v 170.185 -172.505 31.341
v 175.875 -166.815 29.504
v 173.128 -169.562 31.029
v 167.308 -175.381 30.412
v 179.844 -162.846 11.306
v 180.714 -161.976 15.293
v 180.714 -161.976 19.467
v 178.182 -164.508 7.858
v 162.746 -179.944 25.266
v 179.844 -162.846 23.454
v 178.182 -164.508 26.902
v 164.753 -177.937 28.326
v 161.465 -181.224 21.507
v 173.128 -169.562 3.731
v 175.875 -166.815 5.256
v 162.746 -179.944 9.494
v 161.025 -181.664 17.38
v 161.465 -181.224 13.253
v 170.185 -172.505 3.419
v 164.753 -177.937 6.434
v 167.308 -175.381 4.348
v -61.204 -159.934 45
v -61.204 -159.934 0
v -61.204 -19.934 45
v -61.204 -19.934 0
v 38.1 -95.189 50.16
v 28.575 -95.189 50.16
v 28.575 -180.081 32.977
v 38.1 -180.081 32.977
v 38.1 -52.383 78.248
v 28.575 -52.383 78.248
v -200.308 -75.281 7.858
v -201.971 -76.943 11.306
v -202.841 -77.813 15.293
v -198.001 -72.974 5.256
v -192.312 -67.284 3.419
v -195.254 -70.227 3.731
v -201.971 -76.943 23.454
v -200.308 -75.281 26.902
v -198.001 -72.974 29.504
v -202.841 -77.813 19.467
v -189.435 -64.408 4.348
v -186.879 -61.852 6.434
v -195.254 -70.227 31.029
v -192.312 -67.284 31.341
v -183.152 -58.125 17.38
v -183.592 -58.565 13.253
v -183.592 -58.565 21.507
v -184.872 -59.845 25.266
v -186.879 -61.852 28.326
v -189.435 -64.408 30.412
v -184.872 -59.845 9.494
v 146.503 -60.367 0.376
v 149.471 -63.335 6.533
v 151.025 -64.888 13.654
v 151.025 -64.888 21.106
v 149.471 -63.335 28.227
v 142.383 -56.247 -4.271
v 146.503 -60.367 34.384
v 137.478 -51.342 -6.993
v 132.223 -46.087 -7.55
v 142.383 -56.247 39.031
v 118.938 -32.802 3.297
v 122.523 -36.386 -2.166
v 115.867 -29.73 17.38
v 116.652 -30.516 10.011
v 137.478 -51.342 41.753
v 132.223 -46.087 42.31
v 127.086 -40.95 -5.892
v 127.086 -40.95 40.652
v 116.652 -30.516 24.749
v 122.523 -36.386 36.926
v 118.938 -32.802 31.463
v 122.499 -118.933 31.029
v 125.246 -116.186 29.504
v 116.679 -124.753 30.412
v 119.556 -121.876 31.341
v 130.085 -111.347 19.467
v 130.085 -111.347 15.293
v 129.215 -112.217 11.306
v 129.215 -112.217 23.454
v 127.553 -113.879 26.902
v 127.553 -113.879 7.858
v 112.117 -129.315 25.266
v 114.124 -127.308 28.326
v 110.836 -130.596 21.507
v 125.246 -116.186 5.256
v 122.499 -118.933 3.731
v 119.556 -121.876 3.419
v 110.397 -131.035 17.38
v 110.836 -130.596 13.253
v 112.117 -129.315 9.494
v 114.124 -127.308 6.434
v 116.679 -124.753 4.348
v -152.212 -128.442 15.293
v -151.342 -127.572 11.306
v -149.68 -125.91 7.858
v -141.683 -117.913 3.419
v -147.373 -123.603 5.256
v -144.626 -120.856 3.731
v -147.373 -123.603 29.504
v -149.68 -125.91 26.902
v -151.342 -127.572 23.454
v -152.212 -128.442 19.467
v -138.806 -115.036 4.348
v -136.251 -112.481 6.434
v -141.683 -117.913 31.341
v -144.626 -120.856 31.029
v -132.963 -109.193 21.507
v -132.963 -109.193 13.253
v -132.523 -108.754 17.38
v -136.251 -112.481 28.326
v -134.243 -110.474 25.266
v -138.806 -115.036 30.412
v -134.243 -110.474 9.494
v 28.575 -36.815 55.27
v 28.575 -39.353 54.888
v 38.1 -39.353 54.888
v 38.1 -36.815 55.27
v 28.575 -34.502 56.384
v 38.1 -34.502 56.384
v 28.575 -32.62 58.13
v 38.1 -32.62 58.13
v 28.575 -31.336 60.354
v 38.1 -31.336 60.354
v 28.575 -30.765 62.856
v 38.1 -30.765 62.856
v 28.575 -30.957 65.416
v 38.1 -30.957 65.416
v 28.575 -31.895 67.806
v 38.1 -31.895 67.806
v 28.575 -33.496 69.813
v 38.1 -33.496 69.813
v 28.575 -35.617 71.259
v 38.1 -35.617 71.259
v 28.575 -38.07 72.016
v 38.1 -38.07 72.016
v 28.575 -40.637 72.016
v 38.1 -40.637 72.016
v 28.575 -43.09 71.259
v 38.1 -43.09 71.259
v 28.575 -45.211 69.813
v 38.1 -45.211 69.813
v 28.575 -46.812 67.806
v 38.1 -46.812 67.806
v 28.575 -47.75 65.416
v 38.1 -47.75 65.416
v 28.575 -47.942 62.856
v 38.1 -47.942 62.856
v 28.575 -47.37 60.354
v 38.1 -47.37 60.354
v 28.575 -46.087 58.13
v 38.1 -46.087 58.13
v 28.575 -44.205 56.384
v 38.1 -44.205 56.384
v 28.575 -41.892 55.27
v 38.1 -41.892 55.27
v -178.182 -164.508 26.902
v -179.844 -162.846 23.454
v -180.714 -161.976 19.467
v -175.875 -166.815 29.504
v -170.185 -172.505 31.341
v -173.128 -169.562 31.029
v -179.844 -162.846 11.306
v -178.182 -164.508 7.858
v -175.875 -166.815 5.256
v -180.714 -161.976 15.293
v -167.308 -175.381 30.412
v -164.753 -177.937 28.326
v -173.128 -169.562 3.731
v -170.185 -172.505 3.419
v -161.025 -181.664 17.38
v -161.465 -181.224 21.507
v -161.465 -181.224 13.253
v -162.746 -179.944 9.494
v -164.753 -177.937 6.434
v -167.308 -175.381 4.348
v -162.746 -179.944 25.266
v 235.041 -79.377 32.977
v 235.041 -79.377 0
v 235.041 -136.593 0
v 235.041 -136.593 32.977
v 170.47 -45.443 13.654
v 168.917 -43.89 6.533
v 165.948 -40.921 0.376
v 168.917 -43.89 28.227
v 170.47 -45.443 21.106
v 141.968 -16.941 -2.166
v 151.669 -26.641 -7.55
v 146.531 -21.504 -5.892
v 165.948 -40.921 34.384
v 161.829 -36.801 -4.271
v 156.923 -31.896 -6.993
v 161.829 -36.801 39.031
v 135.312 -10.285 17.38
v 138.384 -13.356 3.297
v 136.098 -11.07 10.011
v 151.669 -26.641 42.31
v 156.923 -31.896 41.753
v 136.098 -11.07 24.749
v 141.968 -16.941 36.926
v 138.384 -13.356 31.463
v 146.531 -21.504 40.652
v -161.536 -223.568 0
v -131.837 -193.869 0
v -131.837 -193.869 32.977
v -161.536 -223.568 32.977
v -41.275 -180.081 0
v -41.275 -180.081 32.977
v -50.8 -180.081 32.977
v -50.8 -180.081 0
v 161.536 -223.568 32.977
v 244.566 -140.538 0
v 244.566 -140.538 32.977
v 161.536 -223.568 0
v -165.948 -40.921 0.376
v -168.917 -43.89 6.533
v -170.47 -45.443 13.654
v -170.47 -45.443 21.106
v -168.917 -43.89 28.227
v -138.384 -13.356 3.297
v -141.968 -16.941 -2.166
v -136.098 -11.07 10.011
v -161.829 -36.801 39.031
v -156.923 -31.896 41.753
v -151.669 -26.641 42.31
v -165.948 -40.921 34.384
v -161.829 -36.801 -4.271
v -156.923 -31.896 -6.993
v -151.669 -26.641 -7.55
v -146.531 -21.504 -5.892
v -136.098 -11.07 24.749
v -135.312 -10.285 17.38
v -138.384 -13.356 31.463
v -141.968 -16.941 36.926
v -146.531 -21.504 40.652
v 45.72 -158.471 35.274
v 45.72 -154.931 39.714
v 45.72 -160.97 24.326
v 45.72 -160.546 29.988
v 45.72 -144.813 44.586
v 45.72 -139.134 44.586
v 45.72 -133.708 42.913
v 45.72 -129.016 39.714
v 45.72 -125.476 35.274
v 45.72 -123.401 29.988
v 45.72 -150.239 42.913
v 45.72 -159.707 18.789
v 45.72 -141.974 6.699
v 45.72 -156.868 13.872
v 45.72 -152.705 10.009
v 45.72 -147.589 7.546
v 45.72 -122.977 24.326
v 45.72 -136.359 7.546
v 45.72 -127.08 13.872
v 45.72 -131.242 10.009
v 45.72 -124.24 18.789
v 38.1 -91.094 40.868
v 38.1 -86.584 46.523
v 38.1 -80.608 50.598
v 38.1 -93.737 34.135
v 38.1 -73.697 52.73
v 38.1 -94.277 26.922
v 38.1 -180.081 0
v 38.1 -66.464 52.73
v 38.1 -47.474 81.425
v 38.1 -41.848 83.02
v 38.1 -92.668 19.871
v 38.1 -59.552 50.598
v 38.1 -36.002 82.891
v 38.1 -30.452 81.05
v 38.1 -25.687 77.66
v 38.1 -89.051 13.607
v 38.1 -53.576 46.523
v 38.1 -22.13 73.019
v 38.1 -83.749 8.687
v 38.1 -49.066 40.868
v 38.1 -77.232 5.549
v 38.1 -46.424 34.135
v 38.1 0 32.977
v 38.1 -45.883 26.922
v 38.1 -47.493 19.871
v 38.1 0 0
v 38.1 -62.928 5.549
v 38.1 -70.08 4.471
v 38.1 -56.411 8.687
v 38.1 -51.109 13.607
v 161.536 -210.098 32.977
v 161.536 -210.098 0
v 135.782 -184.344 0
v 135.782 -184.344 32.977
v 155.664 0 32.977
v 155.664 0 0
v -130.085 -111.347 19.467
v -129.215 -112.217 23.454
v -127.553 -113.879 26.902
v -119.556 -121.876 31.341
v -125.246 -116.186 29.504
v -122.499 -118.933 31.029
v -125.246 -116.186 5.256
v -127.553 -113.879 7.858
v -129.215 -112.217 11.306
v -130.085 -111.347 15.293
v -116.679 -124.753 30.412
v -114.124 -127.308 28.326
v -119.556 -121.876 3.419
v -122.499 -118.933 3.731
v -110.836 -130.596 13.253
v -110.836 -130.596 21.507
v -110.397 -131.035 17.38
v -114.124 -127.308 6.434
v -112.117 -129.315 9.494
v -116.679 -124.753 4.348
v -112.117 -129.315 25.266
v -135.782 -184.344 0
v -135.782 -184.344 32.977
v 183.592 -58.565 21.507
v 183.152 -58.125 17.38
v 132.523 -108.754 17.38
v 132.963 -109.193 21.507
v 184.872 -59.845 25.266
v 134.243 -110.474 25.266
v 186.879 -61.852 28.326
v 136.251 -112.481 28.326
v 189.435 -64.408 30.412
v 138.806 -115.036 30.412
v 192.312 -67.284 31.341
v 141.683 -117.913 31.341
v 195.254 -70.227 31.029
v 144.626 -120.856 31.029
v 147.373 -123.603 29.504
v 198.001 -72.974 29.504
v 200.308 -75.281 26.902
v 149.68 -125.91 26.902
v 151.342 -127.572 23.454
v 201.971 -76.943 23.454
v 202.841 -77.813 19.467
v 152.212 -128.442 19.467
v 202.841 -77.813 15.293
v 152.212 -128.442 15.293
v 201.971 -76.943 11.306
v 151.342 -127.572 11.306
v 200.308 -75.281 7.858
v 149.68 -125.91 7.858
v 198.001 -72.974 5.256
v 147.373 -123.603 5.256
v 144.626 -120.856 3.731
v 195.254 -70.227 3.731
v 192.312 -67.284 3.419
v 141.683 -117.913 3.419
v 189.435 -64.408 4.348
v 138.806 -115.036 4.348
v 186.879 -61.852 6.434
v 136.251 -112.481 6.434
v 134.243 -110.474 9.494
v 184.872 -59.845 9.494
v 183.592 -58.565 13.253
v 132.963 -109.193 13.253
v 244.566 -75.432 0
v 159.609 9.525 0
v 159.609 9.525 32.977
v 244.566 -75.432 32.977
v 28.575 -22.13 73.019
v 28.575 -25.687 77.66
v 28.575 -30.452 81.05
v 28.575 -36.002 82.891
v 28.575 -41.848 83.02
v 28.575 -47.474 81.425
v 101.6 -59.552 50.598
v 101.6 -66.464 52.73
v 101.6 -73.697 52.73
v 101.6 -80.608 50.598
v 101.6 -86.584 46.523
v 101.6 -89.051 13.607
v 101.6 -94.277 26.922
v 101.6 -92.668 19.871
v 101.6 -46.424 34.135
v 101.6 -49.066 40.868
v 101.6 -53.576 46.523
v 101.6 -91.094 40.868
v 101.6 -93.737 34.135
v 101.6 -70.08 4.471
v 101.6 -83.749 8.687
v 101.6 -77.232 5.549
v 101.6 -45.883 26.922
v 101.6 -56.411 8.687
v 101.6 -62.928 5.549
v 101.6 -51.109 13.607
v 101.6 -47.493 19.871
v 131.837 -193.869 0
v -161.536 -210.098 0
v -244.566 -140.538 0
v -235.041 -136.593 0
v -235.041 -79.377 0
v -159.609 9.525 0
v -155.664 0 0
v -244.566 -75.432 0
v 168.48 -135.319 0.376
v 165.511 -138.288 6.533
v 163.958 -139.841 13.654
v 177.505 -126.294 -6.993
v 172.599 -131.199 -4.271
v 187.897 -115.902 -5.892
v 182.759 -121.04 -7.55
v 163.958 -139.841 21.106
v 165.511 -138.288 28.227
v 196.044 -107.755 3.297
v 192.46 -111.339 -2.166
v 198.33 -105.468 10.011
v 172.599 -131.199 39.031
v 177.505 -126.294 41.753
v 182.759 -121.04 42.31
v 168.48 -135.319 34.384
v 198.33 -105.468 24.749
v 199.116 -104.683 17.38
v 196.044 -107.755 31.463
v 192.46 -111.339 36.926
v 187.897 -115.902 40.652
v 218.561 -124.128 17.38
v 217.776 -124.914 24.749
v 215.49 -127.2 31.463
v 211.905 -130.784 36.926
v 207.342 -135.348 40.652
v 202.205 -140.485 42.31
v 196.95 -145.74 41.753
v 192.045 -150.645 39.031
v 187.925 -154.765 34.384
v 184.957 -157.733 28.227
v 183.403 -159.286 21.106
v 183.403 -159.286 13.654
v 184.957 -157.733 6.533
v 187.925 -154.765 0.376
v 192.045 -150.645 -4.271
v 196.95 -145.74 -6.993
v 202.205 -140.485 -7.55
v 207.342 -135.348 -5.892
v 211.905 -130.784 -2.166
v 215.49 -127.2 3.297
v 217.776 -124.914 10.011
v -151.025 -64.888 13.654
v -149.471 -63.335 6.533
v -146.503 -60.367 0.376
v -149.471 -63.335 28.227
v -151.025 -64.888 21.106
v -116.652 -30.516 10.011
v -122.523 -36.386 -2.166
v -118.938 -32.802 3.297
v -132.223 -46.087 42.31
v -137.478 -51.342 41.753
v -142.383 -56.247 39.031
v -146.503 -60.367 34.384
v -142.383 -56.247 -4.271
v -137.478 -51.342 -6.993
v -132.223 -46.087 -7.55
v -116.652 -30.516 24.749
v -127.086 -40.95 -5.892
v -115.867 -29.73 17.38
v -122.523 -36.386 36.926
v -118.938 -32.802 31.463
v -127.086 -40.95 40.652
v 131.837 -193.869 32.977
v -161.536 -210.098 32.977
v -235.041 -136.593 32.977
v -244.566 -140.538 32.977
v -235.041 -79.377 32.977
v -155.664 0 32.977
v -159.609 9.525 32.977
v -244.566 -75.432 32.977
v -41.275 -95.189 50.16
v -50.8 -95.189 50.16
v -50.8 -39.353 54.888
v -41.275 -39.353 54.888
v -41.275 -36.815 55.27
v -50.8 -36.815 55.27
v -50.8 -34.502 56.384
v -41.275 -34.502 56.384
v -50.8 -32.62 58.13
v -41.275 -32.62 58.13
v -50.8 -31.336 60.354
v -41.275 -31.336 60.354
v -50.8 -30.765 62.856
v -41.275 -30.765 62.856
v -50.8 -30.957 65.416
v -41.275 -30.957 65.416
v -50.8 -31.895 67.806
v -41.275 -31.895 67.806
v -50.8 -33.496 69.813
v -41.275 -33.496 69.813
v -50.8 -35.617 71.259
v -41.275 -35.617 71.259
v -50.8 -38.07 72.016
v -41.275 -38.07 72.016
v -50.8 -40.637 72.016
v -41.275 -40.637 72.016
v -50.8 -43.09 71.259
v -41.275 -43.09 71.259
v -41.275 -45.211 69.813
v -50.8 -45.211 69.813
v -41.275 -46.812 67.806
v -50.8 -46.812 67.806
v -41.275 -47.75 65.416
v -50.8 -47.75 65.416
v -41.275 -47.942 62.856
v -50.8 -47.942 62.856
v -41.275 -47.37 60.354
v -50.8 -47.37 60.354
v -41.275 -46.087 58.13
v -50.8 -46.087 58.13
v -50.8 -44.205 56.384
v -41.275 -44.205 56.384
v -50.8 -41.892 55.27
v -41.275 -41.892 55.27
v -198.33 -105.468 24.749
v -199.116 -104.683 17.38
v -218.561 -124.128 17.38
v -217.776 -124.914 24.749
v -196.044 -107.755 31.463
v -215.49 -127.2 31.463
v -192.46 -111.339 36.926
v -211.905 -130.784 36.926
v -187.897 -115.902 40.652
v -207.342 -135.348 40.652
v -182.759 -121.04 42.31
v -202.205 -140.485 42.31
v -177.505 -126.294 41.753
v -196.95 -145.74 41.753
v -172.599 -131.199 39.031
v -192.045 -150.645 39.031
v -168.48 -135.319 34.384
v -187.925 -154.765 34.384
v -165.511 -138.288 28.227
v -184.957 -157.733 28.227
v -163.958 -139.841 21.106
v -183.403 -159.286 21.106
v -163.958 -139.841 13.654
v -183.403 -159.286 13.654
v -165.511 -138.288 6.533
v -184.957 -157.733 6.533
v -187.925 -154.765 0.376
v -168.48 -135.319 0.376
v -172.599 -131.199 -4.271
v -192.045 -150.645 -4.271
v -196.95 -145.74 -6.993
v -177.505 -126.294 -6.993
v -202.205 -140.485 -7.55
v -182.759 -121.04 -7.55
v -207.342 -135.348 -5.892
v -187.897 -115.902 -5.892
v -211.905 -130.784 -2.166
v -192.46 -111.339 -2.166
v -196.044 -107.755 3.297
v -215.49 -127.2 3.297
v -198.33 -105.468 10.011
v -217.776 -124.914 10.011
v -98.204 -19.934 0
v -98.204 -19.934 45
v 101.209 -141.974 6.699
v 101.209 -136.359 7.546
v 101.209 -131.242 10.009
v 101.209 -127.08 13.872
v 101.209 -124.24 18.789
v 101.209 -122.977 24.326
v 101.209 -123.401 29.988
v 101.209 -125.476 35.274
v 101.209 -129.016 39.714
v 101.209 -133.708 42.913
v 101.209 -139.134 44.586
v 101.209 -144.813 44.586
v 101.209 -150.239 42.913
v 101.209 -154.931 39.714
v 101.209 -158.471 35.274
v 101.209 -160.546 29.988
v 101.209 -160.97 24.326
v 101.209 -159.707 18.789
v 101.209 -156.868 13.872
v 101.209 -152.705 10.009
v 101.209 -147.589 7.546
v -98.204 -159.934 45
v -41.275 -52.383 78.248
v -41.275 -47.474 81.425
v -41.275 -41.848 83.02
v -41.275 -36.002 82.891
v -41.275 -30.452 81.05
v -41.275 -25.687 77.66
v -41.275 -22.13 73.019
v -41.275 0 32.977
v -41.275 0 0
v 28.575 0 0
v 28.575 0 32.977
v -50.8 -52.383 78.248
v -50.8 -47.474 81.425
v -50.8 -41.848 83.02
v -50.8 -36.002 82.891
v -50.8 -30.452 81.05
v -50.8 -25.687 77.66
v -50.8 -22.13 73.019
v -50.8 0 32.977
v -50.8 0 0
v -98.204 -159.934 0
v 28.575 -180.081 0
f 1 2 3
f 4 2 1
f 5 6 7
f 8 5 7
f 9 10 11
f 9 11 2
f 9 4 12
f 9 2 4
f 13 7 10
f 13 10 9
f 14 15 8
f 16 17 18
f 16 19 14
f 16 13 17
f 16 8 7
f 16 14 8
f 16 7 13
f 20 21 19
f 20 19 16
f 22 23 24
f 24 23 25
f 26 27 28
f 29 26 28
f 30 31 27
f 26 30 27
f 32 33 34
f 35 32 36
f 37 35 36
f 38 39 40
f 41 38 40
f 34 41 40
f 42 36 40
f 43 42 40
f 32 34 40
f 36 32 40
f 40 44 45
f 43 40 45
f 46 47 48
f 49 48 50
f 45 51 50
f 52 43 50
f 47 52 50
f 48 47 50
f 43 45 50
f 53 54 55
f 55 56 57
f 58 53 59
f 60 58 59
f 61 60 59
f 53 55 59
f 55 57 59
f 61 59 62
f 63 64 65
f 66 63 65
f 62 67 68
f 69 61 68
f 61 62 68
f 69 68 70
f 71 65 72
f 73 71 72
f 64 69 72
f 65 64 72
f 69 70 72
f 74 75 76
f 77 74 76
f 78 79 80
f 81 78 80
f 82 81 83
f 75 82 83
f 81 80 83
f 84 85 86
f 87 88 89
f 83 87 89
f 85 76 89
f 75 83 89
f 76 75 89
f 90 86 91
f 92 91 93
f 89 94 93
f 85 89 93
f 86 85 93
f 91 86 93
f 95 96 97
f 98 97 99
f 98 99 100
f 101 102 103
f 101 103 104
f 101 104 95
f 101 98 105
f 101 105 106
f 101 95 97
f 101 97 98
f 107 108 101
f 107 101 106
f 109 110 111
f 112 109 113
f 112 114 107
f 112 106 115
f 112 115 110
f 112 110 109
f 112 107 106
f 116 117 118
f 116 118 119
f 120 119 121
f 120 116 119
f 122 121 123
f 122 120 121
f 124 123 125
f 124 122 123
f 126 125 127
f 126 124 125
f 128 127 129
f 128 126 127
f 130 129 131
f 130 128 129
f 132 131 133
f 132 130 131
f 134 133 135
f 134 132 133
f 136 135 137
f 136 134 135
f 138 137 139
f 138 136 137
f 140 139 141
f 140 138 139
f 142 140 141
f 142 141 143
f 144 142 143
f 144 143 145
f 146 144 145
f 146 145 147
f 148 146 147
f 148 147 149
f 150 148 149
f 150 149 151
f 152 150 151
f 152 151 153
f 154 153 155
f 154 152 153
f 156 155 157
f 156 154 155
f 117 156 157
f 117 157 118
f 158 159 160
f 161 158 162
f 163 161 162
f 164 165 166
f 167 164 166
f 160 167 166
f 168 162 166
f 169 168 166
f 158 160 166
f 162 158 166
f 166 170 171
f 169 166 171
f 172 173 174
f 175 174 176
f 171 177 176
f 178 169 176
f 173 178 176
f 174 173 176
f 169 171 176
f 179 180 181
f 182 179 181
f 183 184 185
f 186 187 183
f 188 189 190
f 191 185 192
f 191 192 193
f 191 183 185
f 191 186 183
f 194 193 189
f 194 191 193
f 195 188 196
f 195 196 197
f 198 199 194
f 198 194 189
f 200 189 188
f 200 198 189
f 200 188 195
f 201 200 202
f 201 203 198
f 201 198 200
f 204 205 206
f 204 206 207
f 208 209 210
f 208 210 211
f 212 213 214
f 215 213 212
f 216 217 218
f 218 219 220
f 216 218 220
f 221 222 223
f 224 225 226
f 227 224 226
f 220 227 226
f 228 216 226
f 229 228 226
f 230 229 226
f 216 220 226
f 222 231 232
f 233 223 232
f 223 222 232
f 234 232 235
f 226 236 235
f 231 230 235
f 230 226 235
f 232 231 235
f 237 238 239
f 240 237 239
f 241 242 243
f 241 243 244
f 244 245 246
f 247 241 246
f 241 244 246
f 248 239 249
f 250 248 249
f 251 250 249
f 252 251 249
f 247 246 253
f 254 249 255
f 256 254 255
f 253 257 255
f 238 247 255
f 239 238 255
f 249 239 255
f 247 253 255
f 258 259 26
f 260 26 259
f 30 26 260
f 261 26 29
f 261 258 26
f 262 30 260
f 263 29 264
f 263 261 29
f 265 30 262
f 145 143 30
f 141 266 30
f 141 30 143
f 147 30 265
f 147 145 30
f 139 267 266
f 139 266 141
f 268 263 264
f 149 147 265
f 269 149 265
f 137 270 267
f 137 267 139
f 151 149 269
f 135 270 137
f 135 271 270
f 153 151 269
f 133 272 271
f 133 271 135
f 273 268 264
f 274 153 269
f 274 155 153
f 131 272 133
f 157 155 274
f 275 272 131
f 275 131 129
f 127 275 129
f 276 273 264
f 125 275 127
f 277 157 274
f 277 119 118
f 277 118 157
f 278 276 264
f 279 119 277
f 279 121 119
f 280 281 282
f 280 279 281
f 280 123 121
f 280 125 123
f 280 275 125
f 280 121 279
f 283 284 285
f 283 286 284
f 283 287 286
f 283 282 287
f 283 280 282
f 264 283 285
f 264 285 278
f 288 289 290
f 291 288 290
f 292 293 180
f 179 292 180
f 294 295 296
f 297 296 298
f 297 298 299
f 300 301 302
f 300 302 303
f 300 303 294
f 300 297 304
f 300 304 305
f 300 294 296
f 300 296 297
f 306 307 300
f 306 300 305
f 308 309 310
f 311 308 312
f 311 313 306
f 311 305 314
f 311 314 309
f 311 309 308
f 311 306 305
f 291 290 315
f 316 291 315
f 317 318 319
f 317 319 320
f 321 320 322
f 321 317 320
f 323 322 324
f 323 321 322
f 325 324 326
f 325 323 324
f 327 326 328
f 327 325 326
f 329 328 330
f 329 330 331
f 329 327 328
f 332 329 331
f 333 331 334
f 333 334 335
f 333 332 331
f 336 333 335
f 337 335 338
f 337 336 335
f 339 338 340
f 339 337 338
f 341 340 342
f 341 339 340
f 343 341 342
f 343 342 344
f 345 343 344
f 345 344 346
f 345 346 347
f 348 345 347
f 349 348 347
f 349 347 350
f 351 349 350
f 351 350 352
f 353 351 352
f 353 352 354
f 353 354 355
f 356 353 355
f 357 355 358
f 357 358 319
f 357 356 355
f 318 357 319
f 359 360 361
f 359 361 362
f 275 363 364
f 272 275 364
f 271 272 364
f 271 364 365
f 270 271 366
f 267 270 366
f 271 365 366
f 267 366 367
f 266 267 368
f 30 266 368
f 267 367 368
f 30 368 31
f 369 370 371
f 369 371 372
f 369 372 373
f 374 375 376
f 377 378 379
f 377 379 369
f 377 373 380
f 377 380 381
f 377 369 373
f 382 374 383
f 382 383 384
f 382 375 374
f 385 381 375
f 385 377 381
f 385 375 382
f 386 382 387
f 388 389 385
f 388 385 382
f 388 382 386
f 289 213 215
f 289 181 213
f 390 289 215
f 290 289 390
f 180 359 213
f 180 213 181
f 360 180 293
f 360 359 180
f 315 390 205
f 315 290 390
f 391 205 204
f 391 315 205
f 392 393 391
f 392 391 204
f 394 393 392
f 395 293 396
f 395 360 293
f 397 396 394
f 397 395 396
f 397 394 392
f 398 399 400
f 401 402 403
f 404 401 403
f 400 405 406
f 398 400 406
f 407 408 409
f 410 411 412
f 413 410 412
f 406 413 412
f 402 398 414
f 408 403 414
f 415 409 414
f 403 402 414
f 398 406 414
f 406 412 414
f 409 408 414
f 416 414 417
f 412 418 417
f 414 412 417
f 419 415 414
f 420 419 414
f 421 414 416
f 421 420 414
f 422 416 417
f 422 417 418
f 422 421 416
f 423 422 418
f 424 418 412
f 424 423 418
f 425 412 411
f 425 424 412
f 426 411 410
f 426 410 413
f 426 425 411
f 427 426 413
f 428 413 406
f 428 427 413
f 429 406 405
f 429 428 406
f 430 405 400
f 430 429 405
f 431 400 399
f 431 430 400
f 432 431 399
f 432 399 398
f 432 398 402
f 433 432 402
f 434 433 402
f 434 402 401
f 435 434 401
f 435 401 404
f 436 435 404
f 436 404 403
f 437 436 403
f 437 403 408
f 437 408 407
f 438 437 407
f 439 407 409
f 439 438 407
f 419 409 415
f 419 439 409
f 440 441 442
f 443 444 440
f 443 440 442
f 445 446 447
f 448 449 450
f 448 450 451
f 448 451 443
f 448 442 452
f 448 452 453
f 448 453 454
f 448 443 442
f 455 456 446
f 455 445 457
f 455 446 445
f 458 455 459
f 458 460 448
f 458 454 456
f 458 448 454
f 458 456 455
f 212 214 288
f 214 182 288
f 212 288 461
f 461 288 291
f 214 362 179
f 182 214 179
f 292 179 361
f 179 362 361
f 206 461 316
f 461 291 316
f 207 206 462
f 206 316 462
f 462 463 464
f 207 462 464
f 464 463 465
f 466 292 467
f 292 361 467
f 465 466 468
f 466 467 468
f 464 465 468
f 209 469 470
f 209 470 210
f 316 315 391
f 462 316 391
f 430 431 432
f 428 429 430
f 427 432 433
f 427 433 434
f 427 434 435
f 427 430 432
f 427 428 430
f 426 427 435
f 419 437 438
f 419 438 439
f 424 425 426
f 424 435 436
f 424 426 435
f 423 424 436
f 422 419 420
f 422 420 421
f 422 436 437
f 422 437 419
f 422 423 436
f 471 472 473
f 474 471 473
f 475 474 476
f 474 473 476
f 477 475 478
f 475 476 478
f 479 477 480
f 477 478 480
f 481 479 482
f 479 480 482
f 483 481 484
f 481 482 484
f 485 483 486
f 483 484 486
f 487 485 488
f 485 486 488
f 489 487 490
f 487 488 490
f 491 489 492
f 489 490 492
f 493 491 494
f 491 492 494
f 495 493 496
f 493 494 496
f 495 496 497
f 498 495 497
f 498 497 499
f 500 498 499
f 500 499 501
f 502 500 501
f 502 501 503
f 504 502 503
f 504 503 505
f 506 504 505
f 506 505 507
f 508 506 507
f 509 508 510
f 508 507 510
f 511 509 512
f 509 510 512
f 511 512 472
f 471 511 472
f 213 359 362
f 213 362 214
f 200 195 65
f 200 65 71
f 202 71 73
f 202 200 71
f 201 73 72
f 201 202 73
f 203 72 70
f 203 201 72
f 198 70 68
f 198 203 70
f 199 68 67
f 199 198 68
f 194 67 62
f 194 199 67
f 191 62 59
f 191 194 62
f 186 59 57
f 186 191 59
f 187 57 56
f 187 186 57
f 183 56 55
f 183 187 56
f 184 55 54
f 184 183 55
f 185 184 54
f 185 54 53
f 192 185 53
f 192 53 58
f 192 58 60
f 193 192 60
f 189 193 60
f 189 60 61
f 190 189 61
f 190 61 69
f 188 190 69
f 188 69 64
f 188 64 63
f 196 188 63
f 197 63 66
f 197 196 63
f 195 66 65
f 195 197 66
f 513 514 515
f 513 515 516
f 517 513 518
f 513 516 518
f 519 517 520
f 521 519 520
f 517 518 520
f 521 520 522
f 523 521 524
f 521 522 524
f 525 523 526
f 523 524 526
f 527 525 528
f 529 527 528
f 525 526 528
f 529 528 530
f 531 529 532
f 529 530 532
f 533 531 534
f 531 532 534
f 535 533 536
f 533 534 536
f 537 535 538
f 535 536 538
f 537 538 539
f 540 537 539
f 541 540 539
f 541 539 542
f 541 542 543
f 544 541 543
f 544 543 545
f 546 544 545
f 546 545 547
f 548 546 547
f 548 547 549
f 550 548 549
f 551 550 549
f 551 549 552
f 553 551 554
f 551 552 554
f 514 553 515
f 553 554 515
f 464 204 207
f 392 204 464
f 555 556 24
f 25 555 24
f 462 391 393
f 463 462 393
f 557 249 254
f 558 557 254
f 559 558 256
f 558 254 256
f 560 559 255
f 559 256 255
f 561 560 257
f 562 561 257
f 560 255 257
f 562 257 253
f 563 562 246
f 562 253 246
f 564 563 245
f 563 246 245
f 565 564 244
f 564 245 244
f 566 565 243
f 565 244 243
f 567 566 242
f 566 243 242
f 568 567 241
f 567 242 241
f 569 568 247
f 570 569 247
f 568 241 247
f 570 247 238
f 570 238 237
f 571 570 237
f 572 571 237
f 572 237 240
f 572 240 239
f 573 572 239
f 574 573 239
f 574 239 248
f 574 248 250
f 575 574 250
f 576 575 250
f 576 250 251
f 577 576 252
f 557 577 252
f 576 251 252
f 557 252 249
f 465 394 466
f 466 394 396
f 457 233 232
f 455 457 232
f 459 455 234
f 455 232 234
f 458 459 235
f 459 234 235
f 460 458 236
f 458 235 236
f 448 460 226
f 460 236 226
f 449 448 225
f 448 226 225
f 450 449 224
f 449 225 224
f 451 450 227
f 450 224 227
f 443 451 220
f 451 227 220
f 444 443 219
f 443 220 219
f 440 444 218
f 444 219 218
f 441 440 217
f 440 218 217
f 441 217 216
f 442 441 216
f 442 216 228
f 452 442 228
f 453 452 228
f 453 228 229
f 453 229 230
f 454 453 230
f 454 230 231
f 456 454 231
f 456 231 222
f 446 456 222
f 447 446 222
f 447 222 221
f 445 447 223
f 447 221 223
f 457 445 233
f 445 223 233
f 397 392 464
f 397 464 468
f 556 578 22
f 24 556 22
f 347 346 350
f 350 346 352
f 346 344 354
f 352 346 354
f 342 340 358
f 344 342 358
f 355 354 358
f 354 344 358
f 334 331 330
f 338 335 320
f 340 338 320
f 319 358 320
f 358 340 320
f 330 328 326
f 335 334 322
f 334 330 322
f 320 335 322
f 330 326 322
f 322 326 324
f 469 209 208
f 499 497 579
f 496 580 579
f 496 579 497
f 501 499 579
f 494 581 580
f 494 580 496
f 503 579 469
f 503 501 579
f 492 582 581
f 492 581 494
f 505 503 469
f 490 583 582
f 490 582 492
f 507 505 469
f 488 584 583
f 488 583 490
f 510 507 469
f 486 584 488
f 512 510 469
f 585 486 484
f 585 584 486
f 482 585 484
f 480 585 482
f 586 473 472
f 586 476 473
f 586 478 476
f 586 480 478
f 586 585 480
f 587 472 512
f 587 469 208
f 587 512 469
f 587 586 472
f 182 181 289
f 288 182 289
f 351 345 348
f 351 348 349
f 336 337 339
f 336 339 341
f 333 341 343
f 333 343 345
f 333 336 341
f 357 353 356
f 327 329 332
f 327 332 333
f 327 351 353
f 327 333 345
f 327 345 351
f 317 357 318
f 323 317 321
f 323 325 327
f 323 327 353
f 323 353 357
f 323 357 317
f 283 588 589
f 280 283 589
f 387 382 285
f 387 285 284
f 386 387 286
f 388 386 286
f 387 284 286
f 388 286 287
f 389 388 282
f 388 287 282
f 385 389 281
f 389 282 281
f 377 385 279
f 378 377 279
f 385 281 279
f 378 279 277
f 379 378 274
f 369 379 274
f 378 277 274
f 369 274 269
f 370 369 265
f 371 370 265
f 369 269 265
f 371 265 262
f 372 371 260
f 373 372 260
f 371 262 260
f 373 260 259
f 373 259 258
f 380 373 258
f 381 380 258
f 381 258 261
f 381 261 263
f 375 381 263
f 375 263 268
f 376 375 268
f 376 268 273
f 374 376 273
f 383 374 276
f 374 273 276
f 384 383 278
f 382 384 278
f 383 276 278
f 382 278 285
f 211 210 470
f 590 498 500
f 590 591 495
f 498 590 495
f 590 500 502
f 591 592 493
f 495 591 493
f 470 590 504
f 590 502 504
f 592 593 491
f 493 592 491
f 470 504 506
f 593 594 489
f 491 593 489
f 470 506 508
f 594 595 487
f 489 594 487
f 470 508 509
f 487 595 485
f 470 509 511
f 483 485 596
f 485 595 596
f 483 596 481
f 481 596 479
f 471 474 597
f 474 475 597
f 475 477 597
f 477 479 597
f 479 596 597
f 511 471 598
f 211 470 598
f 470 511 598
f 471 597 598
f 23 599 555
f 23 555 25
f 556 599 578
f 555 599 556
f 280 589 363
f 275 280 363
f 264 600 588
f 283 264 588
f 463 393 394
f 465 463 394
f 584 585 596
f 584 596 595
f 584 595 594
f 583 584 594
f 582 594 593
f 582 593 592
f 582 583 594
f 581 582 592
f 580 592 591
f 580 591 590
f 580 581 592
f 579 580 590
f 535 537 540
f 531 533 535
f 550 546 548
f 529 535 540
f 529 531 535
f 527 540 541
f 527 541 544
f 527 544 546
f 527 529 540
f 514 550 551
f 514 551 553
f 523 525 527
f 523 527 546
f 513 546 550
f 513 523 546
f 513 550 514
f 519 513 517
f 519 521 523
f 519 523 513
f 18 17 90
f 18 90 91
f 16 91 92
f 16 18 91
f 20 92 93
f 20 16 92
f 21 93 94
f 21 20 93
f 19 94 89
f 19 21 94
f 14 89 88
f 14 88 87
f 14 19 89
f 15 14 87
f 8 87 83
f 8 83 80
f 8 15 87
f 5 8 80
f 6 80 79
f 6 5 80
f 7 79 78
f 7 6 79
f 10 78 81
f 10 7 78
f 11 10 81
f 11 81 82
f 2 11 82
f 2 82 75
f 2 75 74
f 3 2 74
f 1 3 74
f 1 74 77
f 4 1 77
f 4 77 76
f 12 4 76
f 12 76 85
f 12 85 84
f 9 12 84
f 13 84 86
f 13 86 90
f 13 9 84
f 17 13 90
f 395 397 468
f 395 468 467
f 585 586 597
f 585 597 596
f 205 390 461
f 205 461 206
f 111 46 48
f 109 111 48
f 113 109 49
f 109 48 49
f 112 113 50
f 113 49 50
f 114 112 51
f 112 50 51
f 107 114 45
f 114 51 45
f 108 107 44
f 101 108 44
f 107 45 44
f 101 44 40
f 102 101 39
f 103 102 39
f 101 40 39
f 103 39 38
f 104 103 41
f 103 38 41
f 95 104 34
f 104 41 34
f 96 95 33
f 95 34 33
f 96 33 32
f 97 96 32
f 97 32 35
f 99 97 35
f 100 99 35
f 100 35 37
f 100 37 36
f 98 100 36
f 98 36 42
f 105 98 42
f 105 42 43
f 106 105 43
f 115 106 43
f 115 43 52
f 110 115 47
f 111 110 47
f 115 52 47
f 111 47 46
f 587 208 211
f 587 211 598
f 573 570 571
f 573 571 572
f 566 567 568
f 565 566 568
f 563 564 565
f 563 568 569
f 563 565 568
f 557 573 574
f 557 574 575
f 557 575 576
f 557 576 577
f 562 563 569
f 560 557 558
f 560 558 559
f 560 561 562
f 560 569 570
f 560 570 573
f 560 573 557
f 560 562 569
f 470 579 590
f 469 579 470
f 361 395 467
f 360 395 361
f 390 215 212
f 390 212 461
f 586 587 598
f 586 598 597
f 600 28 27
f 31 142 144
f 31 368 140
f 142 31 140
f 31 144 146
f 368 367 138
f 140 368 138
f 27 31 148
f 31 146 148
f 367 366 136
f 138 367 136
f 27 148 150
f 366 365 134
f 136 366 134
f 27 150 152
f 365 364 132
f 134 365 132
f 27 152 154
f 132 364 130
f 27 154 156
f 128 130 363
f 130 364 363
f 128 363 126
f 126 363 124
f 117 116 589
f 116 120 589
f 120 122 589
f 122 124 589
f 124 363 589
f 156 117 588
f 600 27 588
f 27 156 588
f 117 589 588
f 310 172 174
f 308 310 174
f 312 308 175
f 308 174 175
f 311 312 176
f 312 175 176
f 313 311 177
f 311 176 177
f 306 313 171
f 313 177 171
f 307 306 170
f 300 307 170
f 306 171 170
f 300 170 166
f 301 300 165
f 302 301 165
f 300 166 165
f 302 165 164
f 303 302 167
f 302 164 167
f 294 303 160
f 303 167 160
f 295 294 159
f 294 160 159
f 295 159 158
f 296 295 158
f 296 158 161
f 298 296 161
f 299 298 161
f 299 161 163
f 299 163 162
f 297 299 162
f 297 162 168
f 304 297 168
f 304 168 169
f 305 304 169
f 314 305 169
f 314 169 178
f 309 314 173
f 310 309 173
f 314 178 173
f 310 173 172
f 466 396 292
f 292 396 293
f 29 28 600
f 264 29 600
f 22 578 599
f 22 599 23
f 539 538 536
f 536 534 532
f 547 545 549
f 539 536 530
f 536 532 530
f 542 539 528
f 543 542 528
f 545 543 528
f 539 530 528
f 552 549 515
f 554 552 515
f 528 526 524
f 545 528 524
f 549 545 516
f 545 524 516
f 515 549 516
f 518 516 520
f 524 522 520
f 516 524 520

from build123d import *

# Parameters (mm, degrees)
BOSS_EXTRUDE1_OUTLINE_W = 37
BOSS_EXTRUDE1_OUTLINE_H = 140
BOSS_EXTRUDE1_DEPTH     = 45
BOSS_EXTRUDE10_START    = 45.72
SKETCH9_R               = 19.05
BOSS_EXTRUDE10_DEPTH    = 55.488642
BOSS_EXTRUDE11_START    = 38.1
SKETCH9_3_R             = 24.264839711
BOSS_EXTRUDE11_DEPTH    = 63.5
SKETCH2_R               = 25
BOSS_EXTRUDE6_DEPTH     = 27.5
SKETCH3_R               = 25
BOSS_EXTRUDE7_DEPTH     = 27.5
SKETCH4_R               = 14
BOSS_EXTRUDE8_DEPTH     = 71.6
SKETCH5_R               = 14
BOSS_EXTRUDE9_DEPTH     = 71.6
BOSS_EXTRUDE12_START    = -41.275
SKETCH8_R               = 8.612326573
BOSS_EXTRUDE12_DEPTH    = 9.525
BOSS_EXTRUDE13_START    = 28.575
SKETCH8_3_R             = 8.612326573
BOSS_EXTRUDE13_DEPTH    = 9.525
EXTRUDE_THIN2_DEPTH     = 32.9768


# Read off the part's stored shape, not the designer's step: Boss-Extrude1
with BuildPart() as part:
    # Boss-Extrude1 outline → Boss-Extrude1 (new body)
    with BuildSketch(Plane.XY):
        with Locations((-79.704052147, -89.933835326)):
            Rectangle(BOSS_EXTRUDE1_OUTLINE_W, BOSS_EXTRUDE1_OUTLINE_H)
    extrude(amount=BOSS_EXTRUDE1_DEPTH)


with BuildPart() as body_2:
    # Sketch9 → Boss-Extrude10 (new body)
    with BuildSketch(Plane(origin=(0, 0, 0), x_dir=(0, 0, -1), z_dir=(1, 0, 0)).offset(BOSS_EXTRUDE10_START)):
        with Locations((-25.749228435, -141.973618126)):
            Circle(SKETCH9_R)
    extrude(amount=BOSS_EXTRUDE10_DEPTH)


with BuildPart() as body_3:
    # Sketch9<3> → Boss-Extrude11 (new body)
    with BuildSketch(Plane(origin=(0, 0, 0), x_dir=(0, 0, -1), z_dir=(1, 0, 0)).offset(BOSS_EXTRUDE11_START)):
        with Locations((-28.735809635, -70.080189422)):
            Circle(SKETCH9_3_R)
    extrude(amount=BOSS_EXTRUDE11_DEPTH)

    # Sketch8<3> → Boss-Extrude13 (add)
    with BuildSketch(Plane(origin=(0, 0, 0), x_dir=(0, 0, -1), z_dir=(1, 0, 0)).offset(BOSS_EXTRUDE13_START)):
        with BuildLine():
            Line((-32.976800838, 0), (-73.018851768, -22.129862401))
            ThreePointArc((-73.018851768, -22.129862401), (-82.891392915, -36.001914614), (-78.247578803, -52.382875873))
            Line((-78.247578803, -52.382875873), (-50.160237425, -95.1885073))
            Line((-50.160237425, -95.1885073), (-32.976800838, -180.080796112))
            Line((-32.976800838, -180.080796112), (0, -180.080796112))
            Line((0, -180.080796112), (0, 0))
            Line((0, 0), (-32.976800838, 0))
        make_face()
        with Locations((-63.5, -39.353392326)):
            Circle(SKETCH8_3_R, mode=Mode.SUBTRACT)
    extrude(amount=BOSS_EXTRUDE13_DEPTH)


with BuildPart() as body_4:
    # Sketch2 → Boss-Extrude6 (new body)
    with BuildSketch(Plane(origin=(-62.5136693, 62.5136693, 0), x_dir=(0, 0, 1), z_dir=(0.707106781186475, -0.7071067811866201, 0))):
        with Locations(Location((17.38, 127.952586842, 0), (0, 0, 270))):
            Circle(SKETCH2_R)
    extrude(amount=BOSS_EXTRUDE6_DEPTH)


with BuildPart() as body_5:
    # Sketch3 → Boss-Extrude7 (new body)
    with BuildSketch(Plane(origin=(-171.344845243, -171.344845243, 0), x_dir=(0, 0, -1), z_dir=(0.7071067811866171, 0.7071067811864781, 0))):
        with Locations(Location((-17.38, 41.774129956, 0), (0, 0, 90))):
            Circle(SKETCH3_R)
    extrude(amount=BOSS_EXTRUDE7_DEPTH)


with BuildPart() as body_6:
    # Sketch4 → Boss-Extrude8 (new body)
    with BuildSketch(Plane(origin=(-62.5136693, 62.5136693, 0), x_dir=(0, 0, 1), z_dir=(0.707106781186475, -0.7071067811866201, 0))):
        with Locations(Location((17.38, 184.60854676, 0), (0, 0, 270))):
            Circle(SKETCH4_R)
    extrude(amount=BOSS_EXTRUDE8_DEPTH)


with BuildPart() as body_7:
    # Sketch5 → Boss-Extrude9 (new body)
    with BuildSketch(Plane(origin=(-171.344845243, -171.344845243, 0), x_dir=(0, 0, -1), z_dir=(0.7071067811866171, 0.7071067811864781, 0))):
        with Locations(Location((-17.38, -0.593852938, 0), (0, 0, 270))):
            Circle(SKETCH5_R)
    extrude(amount=BOSS_EXTRUDE9_DEPTH)


with BuildPart() as body_8:
    # Sketch8 → Boss-Extrude12 (new body)
    with BuildSketch(Plane(origin=(0, 0, 0), x_dir=(0, 0, -1), z_dir=(1, 0, 0)).offset(BOSS_EXTRUDE12_START)):
        with BuildLine():
            Line((-32.976800838, 0), (-73.018851768, -22.129862401))
            ThreePointArc((-73.018851768, -22.129862401), (-82.891392915, -36.001914614), (-78.247578803, -52.382875873))
            Line((-78.247578803, -52.382875873), (-50.160237425, -95.1885073))
            Line((-50.160237425, -95.1885073), (-32.976800838, -180.080796112))
            Line((-32.976800838, -180.080796112), (0, -180.080796112))
            Line((0, -180.080796112), (0, 0))
            Line((0, 0), (-32.976800838, 0))
        make_face()
        with Locations((-63.5, -39.353392326)):
            Circle(SKETCH8_R, mode=Mode.SUBTRACT)
    extrude(amount=-BOSS_EXTRUDE12_DEPTH)


with BuildPart() as body_9:
    # Mirror3: mirrored copy
    add(body_4.part.mirror(Plane(origin=(0, 0, 0), x_dir=(0, 0, 1), z_dir=(1, 0, 0))))


with BuildPart() as body_10:
    # Mirror3 2: mirrored copy
    add(body_6.part.mirror(Plane(origin=(0, 0, 0), x_dir=(0, 0, 1), z_dir=(1, 0, 0))))


with BuildPart() as body_11:
    # Mirror3 3: mirrored copy
    add(body_5.part.mirror(Plane(origin=(0, 0, 0), x_dir=(0, 0, 1), z_dir=(1, 0, 0))))


with BuildPart() as body_12:
    # Mirror3 4: mirrored copy
    add(body_7.part.mirror(Plane(origin=(0, 0, 0), x_dir=(0, 0, 1), z_dir=(1, 0, 0))))


with BuildPart() as body_13:
    # Sketch10 → Extrude-Thin2 (new body)
    with BuildSketch(Plane(origin=(0, 0, 0), x_dir=(-1, 0, 0), z_dir=(0, 0, -1))):
        Polygon((159.609429883, 9.525), (-159.609429883, 9.525), (-244.565967416, -75.431537533), (-244.565967416, -140.538221375), (-161.535839062, -223.568349729), (-131.836833268, -193.869343934), (131.836833268, -193.869343934), (161.535839062, -223.568349729), (244.565967416, -140.538221375), (244.565967416, -75.431537533), align=None)
        Polygon((155.664045701, 0), (-155.664045701, 0), (-235.040967416, -79.376921715), (-235.040967416, -136.592837193), (-161.535839062, -210.097965547), (-135.782217449, -184.344343934), (135.782217449, -184.344343934), (161.535839062, -210.097965547), (235.040967416, -136.592837193), (235.040967416, -79.376921715), align=None, mode=Mode.SUBTRACT)
    extrude(amount=-EXTRUDE_THIN2_DEPTH)


solid = Compound([part.part, body_2.part, body_3.part, body_4.part, body_5.part, body_6.part, body_7.part, body_8.part, body_9.part, body_10.part, body_11.part, body_12.part, body_13.part])
